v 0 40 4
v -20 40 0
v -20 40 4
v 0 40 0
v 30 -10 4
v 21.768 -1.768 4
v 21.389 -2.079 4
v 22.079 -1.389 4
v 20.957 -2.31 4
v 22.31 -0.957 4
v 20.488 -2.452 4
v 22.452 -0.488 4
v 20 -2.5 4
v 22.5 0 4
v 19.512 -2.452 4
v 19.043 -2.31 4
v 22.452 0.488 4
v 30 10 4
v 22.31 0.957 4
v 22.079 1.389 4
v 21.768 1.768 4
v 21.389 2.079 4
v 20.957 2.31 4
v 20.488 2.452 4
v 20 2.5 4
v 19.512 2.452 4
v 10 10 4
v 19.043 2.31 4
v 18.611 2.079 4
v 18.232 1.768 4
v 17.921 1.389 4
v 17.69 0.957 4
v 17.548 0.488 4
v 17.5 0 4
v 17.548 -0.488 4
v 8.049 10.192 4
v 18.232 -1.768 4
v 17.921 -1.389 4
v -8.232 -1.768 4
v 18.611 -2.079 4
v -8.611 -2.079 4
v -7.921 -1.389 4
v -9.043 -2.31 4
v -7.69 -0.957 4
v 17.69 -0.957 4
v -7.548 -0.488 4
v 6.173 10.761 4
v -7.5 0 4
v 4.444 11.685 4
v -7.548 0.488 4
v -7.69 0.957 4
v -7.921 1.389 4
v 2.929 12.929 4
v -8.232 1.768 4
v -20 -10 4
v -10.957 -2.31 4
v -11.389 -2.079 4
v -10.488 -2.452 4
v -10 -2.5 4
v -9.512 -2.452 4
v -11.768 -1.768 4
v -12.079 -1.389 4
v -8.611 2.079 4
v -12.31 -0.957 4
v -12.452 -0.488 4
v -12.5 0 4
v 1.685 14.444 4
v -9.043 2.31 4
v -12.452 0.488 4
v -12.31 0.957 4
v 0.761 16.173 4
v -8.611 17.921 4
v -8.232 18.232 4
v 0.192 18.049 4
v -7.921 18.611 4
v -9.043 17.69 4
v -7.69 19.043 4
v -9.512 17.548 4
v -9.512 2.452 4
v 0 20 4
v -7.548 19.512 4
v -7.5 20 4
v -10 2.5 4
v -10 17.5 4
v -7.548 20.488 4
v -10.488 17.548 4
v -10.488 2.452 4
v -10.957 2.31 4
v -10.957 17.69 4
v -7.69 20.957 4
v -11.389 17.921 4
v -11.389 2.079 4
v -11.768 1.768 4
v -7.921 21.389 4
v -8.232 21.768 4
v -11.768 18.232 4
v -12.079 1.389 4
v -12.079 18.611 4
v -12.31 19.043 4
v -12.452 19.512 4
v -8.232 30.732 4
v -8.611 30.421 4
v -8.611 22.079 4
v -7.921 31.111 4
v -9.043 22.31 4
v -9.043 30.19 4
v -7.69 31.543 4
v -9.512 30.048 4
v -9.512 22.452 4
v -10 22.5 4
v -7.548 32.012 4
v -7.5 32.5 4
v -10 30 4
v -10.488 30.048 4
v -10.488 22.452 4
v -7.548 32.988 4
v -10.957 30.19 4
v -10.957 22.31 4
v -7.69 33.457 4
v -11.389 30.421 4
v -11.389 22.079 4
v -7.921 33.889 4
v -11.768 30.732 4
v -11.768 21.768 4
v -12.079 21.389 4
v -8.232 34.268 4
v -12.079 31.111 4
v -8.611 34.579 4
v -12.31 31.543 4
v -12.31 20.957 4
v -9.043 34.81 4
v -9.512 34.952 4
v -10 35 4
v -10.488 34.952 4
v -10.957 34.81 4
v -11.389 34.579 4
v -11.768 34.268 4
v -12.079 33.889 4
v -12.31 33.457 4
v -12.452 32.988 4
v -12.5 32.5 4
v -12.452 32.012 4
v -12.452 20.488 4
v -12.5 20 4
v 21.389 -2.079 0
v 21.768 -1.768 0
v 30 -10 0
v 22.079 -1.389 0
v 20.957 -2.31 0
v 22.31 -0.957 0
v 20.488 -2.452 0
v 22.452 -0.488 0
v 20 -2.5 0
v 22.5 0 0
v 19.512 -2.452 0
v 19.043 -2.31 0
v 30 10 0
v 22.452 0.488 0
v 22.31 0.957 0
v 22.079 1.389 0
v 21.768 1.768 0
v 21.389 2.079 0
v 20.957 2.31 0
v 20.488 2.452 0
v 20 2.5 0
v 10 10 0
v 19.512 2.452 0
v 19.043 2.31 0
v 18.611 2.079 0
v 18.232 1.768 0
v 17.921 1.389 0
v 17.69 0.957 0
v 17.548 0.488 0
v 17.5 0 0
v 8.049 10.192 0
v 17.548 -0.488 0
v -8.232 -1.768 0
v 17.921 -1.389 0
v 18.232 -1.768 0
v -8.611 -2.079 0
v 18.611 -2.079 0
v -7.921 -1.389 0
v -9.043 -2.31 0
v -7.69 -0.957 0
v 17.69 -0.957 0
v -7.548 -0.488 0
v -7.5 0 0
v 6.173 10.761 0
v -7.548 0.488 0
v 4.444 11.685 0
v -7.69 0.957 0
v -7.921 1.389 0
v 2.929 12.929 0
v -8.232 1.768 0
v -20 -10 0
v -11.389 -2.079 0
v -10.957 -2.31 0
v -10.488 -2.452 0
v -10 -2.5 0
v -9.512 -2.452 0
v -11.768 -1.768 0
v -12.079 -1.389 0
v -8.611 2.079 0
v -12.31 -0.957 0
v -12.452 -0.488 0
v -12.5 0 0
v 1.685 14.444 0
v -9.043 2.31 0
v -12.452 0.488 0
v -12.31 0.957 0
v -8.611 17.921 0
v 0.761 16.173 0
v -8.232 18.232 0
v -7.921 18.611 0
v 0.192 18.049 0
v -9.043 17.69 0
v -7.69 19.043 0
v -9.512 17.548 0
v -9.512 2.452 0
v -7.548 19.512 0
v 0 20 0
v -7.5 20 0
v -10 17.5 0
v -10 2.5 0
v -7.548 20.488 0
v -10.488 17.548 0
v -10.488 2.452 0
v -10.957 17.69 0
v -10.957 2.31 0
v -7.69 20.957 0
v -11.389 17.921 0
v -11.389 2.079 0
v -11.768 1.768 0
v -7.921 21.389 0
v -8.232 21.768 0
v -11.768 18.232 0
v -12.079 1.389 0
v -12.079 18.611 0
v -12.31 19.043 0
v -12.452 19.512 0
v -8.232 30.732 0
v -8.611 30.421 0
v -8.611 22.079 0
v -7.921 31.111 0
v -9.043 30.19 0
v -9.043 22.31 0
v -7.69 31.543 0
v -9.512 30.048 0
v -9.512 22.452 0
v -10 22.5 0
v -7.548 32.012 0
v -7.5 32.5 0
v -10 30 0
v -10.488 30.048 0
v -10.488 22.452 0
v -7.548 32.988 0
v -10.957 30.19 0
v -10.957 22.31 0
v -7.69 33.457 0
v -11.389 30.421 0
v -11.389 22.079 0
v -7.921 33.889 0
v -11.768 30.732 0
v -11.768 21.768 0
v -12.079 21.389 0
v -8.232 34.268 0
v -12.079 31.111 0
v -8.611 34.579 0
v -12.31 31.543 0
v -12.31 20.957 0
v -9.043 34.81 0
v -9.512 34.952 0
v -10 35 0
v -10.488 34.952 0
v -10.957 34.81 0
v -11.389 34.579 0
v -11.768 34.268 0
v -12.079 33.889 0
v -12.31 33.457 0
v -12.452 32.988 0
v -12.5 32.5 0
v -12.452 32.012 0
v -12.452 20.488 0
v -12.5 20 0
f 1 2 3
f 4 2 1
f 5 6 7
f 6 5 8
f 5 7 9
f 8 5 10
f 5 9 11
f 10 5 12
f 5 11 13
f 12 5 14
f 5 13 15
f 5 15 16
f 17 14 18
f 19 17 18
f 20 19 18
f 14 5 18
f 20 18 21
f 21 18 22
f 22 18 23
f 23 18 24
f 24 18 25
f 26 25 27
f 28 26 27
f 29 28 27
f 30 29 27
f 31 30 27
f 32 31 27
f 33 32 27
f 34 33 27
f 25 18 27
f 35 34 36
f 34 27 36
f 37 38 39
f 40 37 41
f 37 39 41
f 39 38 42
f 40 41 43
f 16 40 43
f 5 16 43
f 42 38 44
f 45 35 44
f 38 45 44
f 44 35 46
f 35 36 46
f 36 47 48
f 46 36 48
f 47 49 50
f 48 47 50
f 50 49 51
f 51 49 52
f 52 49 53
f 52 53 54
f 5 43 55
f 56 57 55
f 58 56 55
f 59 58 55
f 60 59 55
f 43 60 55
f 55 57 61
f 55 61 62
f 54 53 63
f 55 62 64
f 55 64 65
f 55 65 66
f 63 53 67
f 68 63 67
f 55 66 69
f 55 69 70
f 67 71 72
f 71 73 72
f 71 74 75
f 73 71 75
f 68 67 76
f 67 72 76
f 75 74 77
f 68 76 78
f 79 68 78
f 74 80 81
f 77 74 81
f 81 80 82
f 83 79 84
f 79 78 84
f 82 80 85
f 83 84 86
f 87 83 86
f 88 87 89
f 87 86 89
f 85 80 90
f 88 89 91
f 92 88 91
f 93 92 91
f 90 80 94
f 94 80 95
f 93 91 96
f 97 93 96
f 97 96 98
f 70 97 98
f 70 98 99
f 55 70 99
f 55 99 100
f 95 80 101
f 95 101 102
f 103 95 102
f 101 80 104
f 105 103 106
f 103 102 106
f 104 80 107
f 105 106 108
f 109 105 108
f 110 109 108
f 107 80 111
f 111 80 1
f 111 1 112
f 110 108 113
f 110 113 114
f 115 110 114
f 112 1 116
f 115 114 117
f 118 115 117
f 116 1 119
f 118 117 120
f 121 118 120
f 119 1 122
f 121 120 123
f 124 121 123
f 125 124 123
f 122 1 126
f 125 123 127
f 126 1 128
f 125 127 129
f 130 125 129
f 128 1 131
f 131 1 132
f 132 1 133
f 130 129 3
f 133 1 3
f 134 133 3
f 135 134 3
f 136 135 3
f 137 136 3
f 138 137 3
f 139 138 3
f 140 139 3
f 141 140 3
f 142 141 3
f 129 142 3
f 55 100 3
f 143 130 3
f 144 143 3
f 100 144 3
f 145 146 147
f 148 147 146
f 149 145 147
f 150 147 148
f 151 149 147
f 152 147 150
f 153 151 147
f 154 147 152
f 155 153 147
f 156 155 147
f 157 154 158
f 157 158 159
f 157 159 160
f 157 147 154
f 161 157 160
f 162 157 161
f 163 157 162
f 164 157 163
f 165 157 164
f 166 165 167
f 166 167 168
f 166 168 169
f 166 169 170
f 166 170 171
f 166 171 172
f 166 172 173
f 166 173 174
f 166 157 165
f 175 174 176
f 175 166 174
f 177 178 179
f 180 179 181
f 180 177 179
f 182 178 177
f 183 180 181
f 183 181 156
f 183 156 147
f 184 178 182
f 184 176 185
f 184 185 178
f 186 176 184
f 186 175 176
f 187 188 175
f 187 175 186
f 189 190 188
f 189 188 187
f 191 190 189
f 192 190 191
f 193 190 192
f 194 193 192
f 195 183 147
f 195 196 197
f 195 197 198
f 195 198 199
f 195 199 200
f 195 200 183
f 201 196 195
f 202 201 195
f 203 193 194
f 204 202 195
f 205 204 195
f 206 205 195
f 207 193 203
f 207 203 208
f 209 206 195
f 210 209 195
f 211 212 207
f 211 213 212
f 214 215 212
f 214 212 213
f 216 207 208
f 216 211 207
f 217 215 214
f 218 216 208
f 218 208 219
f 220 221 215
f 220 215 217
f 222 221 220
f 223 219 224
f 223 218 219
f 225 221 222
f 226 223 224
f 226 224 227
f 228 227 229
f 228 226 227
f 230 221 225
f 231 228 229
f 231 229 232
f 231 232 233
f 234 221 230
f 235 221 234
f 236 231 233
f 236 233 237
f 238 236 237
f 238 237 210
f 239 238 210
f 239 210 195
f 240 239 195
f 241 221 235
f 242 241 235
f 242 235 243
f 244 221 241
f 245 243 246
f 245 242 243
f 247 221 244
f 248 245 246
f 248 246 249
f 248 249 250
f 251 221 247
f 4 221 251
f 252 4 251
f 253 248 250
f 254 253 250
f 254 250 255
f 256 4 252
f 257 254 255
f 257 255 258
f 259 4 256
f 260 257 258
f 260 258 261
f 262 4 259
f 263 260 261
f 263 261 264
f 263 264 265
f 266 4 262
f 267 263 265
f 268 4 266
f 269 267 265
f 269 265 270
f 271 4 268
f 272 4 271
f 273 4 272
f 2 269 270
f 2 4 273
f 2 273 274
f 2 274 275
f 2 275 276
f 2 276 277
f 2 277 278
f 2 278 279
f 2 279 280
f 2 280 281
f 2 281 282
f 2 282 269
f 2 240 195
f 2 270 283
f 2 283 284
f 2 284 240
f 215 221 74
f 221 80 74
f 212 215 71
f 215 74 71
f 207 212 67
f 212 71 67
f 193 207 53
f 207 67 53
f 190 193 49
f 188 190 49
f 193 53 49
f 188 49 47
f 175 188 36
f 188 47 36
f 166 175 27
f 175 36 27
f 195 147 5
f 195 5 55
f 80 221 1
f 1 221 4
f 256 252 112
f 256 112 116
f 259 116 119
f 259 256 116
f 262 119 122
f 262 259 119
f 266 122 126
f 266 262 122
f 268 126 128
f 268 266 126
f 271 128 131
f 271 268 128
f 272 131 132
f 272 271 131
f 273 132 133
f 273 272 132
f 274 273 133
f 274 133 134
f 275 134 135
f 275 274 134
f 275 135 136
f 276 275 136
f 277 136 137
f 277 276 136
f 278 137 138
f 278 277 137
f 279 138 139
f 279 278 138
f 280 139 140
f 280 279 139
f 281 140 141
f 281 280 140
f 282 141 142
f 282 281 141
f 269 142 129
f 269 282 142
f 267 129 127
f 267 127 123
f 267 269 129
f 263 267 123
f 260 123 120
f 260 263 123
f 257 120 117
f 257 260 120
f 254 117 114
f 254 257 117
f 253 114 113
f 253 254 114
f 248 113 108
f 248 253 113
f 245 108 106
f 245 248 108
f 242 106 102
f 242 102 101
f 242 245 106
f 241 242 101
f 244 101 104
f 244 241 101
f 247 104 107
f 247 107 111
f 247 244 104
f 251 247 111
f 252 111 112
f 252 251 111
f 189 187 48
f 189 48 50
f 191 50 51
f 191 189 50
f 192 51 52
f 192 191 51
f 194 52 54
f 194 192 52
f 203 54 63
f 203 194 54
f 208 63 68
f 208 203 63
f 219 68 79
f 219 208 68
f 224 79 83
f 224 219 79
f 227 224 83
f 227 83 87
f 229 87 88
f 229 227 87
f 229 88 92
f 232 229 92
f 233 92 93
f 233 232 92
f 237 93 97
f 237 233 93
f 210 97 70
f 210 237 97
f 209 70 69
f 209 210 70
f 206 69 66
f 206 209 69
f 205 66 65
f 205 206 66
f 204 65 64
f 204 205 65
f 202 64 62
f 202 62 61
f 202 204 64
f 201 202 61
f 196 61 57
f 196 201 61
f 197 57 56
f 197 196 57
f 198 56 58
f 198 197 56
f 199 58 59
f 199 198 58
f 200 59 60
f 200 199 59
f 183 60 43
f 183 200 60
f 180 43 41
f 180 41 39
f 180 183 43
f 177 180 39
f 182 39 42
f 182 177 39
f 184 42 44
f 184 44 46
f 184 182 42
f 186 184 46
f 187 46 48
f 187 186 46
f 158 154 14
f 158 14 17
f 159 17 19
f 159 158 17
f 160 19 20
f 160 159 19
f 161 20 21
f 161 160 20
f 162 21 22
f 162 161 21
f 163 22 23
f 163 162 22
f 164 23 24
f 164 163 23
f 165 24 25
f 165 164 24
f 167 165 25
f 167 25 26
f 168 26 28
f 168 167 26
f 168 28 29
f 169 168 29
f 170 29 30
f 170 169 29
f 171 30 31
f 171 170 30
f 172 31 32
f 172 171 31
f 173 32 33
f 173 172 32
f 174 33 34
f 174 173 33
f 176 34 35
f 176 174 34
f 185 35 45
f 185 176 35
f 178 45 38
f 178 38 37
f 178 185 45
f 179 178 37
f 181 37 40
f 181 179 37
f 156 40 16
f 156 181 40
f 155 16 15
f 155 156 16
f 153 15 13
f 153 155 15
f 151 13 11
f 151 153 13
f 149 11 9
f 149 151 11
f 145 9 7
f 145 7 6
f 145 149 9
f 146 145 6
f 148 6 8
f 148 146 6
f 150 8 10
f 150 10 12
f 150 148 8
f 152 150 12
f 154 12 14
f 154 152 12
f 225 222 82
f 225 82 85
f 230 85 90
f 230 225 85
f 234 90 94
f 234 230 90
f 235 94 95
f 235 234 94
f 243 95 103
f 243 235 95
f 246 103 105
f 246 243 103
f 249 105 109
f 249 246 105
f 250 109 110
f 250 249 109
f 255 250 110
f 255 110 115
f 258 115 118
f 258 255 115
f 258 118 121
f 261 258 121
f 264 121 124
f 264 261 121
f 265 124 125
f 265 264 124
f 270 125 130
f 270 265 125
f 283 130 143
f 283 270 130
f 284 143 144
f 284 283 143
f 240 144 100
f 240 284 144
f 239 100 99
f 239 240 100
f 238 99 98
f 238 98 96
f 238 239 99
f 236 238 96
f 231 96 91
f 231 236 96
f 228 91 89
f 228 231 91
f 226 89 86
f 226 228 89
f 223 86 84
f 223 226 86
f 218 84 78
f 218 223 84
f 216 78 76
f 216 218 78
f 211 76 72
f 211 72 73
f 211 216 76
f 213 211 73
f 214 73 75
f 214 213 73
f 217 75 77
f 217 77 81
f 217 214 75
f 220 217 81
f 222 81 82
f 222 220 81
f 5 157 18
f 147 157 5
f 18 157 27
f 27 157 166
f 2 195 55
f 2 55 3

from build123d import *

# Parameters (mm, degrees)
SKETCH1_R           = 2.5
BOSS_EXTRUDE1_DEPTH = 4
FILLET1_R           = 10


with BuildPart() as part:
    # Sketch1 → Boss-Extrude1 (new body)
    with BuildSketch(Plane.XY):
        Polygon((-20, -10), (-20, 40), (0, 40), (0, 20), (0, 10), (10, 10), (30, 10), (30, -10), align=None)
        with Locations((-10, 32.5)):
            Circle(SKETCH1_R, mode=Mode.SUBTRACT)
        with Locations((-10, 0)):
            Circle(SKETCH1_R, mode=Mode.SUBTRACT)
        with Locations((20, 0)):
            Circle(SKETCH1_R, mode=Mode.SUBTRACT)
        with Locations((-10, 20)):
            Circle(SKETCH1_R, mode=Mode.SUBTRACT)
    extrude(amount=BOSS_EXTRUDE1_DEPTH)

    # Fillet1
    fillet1_edges = [part.edges().sort_by_distance(p)[0] for p in [
        (0, 10, 2),
    ]]
    fillet(fillet1_edges, radius=FILLET1_R)


solid = part.part
